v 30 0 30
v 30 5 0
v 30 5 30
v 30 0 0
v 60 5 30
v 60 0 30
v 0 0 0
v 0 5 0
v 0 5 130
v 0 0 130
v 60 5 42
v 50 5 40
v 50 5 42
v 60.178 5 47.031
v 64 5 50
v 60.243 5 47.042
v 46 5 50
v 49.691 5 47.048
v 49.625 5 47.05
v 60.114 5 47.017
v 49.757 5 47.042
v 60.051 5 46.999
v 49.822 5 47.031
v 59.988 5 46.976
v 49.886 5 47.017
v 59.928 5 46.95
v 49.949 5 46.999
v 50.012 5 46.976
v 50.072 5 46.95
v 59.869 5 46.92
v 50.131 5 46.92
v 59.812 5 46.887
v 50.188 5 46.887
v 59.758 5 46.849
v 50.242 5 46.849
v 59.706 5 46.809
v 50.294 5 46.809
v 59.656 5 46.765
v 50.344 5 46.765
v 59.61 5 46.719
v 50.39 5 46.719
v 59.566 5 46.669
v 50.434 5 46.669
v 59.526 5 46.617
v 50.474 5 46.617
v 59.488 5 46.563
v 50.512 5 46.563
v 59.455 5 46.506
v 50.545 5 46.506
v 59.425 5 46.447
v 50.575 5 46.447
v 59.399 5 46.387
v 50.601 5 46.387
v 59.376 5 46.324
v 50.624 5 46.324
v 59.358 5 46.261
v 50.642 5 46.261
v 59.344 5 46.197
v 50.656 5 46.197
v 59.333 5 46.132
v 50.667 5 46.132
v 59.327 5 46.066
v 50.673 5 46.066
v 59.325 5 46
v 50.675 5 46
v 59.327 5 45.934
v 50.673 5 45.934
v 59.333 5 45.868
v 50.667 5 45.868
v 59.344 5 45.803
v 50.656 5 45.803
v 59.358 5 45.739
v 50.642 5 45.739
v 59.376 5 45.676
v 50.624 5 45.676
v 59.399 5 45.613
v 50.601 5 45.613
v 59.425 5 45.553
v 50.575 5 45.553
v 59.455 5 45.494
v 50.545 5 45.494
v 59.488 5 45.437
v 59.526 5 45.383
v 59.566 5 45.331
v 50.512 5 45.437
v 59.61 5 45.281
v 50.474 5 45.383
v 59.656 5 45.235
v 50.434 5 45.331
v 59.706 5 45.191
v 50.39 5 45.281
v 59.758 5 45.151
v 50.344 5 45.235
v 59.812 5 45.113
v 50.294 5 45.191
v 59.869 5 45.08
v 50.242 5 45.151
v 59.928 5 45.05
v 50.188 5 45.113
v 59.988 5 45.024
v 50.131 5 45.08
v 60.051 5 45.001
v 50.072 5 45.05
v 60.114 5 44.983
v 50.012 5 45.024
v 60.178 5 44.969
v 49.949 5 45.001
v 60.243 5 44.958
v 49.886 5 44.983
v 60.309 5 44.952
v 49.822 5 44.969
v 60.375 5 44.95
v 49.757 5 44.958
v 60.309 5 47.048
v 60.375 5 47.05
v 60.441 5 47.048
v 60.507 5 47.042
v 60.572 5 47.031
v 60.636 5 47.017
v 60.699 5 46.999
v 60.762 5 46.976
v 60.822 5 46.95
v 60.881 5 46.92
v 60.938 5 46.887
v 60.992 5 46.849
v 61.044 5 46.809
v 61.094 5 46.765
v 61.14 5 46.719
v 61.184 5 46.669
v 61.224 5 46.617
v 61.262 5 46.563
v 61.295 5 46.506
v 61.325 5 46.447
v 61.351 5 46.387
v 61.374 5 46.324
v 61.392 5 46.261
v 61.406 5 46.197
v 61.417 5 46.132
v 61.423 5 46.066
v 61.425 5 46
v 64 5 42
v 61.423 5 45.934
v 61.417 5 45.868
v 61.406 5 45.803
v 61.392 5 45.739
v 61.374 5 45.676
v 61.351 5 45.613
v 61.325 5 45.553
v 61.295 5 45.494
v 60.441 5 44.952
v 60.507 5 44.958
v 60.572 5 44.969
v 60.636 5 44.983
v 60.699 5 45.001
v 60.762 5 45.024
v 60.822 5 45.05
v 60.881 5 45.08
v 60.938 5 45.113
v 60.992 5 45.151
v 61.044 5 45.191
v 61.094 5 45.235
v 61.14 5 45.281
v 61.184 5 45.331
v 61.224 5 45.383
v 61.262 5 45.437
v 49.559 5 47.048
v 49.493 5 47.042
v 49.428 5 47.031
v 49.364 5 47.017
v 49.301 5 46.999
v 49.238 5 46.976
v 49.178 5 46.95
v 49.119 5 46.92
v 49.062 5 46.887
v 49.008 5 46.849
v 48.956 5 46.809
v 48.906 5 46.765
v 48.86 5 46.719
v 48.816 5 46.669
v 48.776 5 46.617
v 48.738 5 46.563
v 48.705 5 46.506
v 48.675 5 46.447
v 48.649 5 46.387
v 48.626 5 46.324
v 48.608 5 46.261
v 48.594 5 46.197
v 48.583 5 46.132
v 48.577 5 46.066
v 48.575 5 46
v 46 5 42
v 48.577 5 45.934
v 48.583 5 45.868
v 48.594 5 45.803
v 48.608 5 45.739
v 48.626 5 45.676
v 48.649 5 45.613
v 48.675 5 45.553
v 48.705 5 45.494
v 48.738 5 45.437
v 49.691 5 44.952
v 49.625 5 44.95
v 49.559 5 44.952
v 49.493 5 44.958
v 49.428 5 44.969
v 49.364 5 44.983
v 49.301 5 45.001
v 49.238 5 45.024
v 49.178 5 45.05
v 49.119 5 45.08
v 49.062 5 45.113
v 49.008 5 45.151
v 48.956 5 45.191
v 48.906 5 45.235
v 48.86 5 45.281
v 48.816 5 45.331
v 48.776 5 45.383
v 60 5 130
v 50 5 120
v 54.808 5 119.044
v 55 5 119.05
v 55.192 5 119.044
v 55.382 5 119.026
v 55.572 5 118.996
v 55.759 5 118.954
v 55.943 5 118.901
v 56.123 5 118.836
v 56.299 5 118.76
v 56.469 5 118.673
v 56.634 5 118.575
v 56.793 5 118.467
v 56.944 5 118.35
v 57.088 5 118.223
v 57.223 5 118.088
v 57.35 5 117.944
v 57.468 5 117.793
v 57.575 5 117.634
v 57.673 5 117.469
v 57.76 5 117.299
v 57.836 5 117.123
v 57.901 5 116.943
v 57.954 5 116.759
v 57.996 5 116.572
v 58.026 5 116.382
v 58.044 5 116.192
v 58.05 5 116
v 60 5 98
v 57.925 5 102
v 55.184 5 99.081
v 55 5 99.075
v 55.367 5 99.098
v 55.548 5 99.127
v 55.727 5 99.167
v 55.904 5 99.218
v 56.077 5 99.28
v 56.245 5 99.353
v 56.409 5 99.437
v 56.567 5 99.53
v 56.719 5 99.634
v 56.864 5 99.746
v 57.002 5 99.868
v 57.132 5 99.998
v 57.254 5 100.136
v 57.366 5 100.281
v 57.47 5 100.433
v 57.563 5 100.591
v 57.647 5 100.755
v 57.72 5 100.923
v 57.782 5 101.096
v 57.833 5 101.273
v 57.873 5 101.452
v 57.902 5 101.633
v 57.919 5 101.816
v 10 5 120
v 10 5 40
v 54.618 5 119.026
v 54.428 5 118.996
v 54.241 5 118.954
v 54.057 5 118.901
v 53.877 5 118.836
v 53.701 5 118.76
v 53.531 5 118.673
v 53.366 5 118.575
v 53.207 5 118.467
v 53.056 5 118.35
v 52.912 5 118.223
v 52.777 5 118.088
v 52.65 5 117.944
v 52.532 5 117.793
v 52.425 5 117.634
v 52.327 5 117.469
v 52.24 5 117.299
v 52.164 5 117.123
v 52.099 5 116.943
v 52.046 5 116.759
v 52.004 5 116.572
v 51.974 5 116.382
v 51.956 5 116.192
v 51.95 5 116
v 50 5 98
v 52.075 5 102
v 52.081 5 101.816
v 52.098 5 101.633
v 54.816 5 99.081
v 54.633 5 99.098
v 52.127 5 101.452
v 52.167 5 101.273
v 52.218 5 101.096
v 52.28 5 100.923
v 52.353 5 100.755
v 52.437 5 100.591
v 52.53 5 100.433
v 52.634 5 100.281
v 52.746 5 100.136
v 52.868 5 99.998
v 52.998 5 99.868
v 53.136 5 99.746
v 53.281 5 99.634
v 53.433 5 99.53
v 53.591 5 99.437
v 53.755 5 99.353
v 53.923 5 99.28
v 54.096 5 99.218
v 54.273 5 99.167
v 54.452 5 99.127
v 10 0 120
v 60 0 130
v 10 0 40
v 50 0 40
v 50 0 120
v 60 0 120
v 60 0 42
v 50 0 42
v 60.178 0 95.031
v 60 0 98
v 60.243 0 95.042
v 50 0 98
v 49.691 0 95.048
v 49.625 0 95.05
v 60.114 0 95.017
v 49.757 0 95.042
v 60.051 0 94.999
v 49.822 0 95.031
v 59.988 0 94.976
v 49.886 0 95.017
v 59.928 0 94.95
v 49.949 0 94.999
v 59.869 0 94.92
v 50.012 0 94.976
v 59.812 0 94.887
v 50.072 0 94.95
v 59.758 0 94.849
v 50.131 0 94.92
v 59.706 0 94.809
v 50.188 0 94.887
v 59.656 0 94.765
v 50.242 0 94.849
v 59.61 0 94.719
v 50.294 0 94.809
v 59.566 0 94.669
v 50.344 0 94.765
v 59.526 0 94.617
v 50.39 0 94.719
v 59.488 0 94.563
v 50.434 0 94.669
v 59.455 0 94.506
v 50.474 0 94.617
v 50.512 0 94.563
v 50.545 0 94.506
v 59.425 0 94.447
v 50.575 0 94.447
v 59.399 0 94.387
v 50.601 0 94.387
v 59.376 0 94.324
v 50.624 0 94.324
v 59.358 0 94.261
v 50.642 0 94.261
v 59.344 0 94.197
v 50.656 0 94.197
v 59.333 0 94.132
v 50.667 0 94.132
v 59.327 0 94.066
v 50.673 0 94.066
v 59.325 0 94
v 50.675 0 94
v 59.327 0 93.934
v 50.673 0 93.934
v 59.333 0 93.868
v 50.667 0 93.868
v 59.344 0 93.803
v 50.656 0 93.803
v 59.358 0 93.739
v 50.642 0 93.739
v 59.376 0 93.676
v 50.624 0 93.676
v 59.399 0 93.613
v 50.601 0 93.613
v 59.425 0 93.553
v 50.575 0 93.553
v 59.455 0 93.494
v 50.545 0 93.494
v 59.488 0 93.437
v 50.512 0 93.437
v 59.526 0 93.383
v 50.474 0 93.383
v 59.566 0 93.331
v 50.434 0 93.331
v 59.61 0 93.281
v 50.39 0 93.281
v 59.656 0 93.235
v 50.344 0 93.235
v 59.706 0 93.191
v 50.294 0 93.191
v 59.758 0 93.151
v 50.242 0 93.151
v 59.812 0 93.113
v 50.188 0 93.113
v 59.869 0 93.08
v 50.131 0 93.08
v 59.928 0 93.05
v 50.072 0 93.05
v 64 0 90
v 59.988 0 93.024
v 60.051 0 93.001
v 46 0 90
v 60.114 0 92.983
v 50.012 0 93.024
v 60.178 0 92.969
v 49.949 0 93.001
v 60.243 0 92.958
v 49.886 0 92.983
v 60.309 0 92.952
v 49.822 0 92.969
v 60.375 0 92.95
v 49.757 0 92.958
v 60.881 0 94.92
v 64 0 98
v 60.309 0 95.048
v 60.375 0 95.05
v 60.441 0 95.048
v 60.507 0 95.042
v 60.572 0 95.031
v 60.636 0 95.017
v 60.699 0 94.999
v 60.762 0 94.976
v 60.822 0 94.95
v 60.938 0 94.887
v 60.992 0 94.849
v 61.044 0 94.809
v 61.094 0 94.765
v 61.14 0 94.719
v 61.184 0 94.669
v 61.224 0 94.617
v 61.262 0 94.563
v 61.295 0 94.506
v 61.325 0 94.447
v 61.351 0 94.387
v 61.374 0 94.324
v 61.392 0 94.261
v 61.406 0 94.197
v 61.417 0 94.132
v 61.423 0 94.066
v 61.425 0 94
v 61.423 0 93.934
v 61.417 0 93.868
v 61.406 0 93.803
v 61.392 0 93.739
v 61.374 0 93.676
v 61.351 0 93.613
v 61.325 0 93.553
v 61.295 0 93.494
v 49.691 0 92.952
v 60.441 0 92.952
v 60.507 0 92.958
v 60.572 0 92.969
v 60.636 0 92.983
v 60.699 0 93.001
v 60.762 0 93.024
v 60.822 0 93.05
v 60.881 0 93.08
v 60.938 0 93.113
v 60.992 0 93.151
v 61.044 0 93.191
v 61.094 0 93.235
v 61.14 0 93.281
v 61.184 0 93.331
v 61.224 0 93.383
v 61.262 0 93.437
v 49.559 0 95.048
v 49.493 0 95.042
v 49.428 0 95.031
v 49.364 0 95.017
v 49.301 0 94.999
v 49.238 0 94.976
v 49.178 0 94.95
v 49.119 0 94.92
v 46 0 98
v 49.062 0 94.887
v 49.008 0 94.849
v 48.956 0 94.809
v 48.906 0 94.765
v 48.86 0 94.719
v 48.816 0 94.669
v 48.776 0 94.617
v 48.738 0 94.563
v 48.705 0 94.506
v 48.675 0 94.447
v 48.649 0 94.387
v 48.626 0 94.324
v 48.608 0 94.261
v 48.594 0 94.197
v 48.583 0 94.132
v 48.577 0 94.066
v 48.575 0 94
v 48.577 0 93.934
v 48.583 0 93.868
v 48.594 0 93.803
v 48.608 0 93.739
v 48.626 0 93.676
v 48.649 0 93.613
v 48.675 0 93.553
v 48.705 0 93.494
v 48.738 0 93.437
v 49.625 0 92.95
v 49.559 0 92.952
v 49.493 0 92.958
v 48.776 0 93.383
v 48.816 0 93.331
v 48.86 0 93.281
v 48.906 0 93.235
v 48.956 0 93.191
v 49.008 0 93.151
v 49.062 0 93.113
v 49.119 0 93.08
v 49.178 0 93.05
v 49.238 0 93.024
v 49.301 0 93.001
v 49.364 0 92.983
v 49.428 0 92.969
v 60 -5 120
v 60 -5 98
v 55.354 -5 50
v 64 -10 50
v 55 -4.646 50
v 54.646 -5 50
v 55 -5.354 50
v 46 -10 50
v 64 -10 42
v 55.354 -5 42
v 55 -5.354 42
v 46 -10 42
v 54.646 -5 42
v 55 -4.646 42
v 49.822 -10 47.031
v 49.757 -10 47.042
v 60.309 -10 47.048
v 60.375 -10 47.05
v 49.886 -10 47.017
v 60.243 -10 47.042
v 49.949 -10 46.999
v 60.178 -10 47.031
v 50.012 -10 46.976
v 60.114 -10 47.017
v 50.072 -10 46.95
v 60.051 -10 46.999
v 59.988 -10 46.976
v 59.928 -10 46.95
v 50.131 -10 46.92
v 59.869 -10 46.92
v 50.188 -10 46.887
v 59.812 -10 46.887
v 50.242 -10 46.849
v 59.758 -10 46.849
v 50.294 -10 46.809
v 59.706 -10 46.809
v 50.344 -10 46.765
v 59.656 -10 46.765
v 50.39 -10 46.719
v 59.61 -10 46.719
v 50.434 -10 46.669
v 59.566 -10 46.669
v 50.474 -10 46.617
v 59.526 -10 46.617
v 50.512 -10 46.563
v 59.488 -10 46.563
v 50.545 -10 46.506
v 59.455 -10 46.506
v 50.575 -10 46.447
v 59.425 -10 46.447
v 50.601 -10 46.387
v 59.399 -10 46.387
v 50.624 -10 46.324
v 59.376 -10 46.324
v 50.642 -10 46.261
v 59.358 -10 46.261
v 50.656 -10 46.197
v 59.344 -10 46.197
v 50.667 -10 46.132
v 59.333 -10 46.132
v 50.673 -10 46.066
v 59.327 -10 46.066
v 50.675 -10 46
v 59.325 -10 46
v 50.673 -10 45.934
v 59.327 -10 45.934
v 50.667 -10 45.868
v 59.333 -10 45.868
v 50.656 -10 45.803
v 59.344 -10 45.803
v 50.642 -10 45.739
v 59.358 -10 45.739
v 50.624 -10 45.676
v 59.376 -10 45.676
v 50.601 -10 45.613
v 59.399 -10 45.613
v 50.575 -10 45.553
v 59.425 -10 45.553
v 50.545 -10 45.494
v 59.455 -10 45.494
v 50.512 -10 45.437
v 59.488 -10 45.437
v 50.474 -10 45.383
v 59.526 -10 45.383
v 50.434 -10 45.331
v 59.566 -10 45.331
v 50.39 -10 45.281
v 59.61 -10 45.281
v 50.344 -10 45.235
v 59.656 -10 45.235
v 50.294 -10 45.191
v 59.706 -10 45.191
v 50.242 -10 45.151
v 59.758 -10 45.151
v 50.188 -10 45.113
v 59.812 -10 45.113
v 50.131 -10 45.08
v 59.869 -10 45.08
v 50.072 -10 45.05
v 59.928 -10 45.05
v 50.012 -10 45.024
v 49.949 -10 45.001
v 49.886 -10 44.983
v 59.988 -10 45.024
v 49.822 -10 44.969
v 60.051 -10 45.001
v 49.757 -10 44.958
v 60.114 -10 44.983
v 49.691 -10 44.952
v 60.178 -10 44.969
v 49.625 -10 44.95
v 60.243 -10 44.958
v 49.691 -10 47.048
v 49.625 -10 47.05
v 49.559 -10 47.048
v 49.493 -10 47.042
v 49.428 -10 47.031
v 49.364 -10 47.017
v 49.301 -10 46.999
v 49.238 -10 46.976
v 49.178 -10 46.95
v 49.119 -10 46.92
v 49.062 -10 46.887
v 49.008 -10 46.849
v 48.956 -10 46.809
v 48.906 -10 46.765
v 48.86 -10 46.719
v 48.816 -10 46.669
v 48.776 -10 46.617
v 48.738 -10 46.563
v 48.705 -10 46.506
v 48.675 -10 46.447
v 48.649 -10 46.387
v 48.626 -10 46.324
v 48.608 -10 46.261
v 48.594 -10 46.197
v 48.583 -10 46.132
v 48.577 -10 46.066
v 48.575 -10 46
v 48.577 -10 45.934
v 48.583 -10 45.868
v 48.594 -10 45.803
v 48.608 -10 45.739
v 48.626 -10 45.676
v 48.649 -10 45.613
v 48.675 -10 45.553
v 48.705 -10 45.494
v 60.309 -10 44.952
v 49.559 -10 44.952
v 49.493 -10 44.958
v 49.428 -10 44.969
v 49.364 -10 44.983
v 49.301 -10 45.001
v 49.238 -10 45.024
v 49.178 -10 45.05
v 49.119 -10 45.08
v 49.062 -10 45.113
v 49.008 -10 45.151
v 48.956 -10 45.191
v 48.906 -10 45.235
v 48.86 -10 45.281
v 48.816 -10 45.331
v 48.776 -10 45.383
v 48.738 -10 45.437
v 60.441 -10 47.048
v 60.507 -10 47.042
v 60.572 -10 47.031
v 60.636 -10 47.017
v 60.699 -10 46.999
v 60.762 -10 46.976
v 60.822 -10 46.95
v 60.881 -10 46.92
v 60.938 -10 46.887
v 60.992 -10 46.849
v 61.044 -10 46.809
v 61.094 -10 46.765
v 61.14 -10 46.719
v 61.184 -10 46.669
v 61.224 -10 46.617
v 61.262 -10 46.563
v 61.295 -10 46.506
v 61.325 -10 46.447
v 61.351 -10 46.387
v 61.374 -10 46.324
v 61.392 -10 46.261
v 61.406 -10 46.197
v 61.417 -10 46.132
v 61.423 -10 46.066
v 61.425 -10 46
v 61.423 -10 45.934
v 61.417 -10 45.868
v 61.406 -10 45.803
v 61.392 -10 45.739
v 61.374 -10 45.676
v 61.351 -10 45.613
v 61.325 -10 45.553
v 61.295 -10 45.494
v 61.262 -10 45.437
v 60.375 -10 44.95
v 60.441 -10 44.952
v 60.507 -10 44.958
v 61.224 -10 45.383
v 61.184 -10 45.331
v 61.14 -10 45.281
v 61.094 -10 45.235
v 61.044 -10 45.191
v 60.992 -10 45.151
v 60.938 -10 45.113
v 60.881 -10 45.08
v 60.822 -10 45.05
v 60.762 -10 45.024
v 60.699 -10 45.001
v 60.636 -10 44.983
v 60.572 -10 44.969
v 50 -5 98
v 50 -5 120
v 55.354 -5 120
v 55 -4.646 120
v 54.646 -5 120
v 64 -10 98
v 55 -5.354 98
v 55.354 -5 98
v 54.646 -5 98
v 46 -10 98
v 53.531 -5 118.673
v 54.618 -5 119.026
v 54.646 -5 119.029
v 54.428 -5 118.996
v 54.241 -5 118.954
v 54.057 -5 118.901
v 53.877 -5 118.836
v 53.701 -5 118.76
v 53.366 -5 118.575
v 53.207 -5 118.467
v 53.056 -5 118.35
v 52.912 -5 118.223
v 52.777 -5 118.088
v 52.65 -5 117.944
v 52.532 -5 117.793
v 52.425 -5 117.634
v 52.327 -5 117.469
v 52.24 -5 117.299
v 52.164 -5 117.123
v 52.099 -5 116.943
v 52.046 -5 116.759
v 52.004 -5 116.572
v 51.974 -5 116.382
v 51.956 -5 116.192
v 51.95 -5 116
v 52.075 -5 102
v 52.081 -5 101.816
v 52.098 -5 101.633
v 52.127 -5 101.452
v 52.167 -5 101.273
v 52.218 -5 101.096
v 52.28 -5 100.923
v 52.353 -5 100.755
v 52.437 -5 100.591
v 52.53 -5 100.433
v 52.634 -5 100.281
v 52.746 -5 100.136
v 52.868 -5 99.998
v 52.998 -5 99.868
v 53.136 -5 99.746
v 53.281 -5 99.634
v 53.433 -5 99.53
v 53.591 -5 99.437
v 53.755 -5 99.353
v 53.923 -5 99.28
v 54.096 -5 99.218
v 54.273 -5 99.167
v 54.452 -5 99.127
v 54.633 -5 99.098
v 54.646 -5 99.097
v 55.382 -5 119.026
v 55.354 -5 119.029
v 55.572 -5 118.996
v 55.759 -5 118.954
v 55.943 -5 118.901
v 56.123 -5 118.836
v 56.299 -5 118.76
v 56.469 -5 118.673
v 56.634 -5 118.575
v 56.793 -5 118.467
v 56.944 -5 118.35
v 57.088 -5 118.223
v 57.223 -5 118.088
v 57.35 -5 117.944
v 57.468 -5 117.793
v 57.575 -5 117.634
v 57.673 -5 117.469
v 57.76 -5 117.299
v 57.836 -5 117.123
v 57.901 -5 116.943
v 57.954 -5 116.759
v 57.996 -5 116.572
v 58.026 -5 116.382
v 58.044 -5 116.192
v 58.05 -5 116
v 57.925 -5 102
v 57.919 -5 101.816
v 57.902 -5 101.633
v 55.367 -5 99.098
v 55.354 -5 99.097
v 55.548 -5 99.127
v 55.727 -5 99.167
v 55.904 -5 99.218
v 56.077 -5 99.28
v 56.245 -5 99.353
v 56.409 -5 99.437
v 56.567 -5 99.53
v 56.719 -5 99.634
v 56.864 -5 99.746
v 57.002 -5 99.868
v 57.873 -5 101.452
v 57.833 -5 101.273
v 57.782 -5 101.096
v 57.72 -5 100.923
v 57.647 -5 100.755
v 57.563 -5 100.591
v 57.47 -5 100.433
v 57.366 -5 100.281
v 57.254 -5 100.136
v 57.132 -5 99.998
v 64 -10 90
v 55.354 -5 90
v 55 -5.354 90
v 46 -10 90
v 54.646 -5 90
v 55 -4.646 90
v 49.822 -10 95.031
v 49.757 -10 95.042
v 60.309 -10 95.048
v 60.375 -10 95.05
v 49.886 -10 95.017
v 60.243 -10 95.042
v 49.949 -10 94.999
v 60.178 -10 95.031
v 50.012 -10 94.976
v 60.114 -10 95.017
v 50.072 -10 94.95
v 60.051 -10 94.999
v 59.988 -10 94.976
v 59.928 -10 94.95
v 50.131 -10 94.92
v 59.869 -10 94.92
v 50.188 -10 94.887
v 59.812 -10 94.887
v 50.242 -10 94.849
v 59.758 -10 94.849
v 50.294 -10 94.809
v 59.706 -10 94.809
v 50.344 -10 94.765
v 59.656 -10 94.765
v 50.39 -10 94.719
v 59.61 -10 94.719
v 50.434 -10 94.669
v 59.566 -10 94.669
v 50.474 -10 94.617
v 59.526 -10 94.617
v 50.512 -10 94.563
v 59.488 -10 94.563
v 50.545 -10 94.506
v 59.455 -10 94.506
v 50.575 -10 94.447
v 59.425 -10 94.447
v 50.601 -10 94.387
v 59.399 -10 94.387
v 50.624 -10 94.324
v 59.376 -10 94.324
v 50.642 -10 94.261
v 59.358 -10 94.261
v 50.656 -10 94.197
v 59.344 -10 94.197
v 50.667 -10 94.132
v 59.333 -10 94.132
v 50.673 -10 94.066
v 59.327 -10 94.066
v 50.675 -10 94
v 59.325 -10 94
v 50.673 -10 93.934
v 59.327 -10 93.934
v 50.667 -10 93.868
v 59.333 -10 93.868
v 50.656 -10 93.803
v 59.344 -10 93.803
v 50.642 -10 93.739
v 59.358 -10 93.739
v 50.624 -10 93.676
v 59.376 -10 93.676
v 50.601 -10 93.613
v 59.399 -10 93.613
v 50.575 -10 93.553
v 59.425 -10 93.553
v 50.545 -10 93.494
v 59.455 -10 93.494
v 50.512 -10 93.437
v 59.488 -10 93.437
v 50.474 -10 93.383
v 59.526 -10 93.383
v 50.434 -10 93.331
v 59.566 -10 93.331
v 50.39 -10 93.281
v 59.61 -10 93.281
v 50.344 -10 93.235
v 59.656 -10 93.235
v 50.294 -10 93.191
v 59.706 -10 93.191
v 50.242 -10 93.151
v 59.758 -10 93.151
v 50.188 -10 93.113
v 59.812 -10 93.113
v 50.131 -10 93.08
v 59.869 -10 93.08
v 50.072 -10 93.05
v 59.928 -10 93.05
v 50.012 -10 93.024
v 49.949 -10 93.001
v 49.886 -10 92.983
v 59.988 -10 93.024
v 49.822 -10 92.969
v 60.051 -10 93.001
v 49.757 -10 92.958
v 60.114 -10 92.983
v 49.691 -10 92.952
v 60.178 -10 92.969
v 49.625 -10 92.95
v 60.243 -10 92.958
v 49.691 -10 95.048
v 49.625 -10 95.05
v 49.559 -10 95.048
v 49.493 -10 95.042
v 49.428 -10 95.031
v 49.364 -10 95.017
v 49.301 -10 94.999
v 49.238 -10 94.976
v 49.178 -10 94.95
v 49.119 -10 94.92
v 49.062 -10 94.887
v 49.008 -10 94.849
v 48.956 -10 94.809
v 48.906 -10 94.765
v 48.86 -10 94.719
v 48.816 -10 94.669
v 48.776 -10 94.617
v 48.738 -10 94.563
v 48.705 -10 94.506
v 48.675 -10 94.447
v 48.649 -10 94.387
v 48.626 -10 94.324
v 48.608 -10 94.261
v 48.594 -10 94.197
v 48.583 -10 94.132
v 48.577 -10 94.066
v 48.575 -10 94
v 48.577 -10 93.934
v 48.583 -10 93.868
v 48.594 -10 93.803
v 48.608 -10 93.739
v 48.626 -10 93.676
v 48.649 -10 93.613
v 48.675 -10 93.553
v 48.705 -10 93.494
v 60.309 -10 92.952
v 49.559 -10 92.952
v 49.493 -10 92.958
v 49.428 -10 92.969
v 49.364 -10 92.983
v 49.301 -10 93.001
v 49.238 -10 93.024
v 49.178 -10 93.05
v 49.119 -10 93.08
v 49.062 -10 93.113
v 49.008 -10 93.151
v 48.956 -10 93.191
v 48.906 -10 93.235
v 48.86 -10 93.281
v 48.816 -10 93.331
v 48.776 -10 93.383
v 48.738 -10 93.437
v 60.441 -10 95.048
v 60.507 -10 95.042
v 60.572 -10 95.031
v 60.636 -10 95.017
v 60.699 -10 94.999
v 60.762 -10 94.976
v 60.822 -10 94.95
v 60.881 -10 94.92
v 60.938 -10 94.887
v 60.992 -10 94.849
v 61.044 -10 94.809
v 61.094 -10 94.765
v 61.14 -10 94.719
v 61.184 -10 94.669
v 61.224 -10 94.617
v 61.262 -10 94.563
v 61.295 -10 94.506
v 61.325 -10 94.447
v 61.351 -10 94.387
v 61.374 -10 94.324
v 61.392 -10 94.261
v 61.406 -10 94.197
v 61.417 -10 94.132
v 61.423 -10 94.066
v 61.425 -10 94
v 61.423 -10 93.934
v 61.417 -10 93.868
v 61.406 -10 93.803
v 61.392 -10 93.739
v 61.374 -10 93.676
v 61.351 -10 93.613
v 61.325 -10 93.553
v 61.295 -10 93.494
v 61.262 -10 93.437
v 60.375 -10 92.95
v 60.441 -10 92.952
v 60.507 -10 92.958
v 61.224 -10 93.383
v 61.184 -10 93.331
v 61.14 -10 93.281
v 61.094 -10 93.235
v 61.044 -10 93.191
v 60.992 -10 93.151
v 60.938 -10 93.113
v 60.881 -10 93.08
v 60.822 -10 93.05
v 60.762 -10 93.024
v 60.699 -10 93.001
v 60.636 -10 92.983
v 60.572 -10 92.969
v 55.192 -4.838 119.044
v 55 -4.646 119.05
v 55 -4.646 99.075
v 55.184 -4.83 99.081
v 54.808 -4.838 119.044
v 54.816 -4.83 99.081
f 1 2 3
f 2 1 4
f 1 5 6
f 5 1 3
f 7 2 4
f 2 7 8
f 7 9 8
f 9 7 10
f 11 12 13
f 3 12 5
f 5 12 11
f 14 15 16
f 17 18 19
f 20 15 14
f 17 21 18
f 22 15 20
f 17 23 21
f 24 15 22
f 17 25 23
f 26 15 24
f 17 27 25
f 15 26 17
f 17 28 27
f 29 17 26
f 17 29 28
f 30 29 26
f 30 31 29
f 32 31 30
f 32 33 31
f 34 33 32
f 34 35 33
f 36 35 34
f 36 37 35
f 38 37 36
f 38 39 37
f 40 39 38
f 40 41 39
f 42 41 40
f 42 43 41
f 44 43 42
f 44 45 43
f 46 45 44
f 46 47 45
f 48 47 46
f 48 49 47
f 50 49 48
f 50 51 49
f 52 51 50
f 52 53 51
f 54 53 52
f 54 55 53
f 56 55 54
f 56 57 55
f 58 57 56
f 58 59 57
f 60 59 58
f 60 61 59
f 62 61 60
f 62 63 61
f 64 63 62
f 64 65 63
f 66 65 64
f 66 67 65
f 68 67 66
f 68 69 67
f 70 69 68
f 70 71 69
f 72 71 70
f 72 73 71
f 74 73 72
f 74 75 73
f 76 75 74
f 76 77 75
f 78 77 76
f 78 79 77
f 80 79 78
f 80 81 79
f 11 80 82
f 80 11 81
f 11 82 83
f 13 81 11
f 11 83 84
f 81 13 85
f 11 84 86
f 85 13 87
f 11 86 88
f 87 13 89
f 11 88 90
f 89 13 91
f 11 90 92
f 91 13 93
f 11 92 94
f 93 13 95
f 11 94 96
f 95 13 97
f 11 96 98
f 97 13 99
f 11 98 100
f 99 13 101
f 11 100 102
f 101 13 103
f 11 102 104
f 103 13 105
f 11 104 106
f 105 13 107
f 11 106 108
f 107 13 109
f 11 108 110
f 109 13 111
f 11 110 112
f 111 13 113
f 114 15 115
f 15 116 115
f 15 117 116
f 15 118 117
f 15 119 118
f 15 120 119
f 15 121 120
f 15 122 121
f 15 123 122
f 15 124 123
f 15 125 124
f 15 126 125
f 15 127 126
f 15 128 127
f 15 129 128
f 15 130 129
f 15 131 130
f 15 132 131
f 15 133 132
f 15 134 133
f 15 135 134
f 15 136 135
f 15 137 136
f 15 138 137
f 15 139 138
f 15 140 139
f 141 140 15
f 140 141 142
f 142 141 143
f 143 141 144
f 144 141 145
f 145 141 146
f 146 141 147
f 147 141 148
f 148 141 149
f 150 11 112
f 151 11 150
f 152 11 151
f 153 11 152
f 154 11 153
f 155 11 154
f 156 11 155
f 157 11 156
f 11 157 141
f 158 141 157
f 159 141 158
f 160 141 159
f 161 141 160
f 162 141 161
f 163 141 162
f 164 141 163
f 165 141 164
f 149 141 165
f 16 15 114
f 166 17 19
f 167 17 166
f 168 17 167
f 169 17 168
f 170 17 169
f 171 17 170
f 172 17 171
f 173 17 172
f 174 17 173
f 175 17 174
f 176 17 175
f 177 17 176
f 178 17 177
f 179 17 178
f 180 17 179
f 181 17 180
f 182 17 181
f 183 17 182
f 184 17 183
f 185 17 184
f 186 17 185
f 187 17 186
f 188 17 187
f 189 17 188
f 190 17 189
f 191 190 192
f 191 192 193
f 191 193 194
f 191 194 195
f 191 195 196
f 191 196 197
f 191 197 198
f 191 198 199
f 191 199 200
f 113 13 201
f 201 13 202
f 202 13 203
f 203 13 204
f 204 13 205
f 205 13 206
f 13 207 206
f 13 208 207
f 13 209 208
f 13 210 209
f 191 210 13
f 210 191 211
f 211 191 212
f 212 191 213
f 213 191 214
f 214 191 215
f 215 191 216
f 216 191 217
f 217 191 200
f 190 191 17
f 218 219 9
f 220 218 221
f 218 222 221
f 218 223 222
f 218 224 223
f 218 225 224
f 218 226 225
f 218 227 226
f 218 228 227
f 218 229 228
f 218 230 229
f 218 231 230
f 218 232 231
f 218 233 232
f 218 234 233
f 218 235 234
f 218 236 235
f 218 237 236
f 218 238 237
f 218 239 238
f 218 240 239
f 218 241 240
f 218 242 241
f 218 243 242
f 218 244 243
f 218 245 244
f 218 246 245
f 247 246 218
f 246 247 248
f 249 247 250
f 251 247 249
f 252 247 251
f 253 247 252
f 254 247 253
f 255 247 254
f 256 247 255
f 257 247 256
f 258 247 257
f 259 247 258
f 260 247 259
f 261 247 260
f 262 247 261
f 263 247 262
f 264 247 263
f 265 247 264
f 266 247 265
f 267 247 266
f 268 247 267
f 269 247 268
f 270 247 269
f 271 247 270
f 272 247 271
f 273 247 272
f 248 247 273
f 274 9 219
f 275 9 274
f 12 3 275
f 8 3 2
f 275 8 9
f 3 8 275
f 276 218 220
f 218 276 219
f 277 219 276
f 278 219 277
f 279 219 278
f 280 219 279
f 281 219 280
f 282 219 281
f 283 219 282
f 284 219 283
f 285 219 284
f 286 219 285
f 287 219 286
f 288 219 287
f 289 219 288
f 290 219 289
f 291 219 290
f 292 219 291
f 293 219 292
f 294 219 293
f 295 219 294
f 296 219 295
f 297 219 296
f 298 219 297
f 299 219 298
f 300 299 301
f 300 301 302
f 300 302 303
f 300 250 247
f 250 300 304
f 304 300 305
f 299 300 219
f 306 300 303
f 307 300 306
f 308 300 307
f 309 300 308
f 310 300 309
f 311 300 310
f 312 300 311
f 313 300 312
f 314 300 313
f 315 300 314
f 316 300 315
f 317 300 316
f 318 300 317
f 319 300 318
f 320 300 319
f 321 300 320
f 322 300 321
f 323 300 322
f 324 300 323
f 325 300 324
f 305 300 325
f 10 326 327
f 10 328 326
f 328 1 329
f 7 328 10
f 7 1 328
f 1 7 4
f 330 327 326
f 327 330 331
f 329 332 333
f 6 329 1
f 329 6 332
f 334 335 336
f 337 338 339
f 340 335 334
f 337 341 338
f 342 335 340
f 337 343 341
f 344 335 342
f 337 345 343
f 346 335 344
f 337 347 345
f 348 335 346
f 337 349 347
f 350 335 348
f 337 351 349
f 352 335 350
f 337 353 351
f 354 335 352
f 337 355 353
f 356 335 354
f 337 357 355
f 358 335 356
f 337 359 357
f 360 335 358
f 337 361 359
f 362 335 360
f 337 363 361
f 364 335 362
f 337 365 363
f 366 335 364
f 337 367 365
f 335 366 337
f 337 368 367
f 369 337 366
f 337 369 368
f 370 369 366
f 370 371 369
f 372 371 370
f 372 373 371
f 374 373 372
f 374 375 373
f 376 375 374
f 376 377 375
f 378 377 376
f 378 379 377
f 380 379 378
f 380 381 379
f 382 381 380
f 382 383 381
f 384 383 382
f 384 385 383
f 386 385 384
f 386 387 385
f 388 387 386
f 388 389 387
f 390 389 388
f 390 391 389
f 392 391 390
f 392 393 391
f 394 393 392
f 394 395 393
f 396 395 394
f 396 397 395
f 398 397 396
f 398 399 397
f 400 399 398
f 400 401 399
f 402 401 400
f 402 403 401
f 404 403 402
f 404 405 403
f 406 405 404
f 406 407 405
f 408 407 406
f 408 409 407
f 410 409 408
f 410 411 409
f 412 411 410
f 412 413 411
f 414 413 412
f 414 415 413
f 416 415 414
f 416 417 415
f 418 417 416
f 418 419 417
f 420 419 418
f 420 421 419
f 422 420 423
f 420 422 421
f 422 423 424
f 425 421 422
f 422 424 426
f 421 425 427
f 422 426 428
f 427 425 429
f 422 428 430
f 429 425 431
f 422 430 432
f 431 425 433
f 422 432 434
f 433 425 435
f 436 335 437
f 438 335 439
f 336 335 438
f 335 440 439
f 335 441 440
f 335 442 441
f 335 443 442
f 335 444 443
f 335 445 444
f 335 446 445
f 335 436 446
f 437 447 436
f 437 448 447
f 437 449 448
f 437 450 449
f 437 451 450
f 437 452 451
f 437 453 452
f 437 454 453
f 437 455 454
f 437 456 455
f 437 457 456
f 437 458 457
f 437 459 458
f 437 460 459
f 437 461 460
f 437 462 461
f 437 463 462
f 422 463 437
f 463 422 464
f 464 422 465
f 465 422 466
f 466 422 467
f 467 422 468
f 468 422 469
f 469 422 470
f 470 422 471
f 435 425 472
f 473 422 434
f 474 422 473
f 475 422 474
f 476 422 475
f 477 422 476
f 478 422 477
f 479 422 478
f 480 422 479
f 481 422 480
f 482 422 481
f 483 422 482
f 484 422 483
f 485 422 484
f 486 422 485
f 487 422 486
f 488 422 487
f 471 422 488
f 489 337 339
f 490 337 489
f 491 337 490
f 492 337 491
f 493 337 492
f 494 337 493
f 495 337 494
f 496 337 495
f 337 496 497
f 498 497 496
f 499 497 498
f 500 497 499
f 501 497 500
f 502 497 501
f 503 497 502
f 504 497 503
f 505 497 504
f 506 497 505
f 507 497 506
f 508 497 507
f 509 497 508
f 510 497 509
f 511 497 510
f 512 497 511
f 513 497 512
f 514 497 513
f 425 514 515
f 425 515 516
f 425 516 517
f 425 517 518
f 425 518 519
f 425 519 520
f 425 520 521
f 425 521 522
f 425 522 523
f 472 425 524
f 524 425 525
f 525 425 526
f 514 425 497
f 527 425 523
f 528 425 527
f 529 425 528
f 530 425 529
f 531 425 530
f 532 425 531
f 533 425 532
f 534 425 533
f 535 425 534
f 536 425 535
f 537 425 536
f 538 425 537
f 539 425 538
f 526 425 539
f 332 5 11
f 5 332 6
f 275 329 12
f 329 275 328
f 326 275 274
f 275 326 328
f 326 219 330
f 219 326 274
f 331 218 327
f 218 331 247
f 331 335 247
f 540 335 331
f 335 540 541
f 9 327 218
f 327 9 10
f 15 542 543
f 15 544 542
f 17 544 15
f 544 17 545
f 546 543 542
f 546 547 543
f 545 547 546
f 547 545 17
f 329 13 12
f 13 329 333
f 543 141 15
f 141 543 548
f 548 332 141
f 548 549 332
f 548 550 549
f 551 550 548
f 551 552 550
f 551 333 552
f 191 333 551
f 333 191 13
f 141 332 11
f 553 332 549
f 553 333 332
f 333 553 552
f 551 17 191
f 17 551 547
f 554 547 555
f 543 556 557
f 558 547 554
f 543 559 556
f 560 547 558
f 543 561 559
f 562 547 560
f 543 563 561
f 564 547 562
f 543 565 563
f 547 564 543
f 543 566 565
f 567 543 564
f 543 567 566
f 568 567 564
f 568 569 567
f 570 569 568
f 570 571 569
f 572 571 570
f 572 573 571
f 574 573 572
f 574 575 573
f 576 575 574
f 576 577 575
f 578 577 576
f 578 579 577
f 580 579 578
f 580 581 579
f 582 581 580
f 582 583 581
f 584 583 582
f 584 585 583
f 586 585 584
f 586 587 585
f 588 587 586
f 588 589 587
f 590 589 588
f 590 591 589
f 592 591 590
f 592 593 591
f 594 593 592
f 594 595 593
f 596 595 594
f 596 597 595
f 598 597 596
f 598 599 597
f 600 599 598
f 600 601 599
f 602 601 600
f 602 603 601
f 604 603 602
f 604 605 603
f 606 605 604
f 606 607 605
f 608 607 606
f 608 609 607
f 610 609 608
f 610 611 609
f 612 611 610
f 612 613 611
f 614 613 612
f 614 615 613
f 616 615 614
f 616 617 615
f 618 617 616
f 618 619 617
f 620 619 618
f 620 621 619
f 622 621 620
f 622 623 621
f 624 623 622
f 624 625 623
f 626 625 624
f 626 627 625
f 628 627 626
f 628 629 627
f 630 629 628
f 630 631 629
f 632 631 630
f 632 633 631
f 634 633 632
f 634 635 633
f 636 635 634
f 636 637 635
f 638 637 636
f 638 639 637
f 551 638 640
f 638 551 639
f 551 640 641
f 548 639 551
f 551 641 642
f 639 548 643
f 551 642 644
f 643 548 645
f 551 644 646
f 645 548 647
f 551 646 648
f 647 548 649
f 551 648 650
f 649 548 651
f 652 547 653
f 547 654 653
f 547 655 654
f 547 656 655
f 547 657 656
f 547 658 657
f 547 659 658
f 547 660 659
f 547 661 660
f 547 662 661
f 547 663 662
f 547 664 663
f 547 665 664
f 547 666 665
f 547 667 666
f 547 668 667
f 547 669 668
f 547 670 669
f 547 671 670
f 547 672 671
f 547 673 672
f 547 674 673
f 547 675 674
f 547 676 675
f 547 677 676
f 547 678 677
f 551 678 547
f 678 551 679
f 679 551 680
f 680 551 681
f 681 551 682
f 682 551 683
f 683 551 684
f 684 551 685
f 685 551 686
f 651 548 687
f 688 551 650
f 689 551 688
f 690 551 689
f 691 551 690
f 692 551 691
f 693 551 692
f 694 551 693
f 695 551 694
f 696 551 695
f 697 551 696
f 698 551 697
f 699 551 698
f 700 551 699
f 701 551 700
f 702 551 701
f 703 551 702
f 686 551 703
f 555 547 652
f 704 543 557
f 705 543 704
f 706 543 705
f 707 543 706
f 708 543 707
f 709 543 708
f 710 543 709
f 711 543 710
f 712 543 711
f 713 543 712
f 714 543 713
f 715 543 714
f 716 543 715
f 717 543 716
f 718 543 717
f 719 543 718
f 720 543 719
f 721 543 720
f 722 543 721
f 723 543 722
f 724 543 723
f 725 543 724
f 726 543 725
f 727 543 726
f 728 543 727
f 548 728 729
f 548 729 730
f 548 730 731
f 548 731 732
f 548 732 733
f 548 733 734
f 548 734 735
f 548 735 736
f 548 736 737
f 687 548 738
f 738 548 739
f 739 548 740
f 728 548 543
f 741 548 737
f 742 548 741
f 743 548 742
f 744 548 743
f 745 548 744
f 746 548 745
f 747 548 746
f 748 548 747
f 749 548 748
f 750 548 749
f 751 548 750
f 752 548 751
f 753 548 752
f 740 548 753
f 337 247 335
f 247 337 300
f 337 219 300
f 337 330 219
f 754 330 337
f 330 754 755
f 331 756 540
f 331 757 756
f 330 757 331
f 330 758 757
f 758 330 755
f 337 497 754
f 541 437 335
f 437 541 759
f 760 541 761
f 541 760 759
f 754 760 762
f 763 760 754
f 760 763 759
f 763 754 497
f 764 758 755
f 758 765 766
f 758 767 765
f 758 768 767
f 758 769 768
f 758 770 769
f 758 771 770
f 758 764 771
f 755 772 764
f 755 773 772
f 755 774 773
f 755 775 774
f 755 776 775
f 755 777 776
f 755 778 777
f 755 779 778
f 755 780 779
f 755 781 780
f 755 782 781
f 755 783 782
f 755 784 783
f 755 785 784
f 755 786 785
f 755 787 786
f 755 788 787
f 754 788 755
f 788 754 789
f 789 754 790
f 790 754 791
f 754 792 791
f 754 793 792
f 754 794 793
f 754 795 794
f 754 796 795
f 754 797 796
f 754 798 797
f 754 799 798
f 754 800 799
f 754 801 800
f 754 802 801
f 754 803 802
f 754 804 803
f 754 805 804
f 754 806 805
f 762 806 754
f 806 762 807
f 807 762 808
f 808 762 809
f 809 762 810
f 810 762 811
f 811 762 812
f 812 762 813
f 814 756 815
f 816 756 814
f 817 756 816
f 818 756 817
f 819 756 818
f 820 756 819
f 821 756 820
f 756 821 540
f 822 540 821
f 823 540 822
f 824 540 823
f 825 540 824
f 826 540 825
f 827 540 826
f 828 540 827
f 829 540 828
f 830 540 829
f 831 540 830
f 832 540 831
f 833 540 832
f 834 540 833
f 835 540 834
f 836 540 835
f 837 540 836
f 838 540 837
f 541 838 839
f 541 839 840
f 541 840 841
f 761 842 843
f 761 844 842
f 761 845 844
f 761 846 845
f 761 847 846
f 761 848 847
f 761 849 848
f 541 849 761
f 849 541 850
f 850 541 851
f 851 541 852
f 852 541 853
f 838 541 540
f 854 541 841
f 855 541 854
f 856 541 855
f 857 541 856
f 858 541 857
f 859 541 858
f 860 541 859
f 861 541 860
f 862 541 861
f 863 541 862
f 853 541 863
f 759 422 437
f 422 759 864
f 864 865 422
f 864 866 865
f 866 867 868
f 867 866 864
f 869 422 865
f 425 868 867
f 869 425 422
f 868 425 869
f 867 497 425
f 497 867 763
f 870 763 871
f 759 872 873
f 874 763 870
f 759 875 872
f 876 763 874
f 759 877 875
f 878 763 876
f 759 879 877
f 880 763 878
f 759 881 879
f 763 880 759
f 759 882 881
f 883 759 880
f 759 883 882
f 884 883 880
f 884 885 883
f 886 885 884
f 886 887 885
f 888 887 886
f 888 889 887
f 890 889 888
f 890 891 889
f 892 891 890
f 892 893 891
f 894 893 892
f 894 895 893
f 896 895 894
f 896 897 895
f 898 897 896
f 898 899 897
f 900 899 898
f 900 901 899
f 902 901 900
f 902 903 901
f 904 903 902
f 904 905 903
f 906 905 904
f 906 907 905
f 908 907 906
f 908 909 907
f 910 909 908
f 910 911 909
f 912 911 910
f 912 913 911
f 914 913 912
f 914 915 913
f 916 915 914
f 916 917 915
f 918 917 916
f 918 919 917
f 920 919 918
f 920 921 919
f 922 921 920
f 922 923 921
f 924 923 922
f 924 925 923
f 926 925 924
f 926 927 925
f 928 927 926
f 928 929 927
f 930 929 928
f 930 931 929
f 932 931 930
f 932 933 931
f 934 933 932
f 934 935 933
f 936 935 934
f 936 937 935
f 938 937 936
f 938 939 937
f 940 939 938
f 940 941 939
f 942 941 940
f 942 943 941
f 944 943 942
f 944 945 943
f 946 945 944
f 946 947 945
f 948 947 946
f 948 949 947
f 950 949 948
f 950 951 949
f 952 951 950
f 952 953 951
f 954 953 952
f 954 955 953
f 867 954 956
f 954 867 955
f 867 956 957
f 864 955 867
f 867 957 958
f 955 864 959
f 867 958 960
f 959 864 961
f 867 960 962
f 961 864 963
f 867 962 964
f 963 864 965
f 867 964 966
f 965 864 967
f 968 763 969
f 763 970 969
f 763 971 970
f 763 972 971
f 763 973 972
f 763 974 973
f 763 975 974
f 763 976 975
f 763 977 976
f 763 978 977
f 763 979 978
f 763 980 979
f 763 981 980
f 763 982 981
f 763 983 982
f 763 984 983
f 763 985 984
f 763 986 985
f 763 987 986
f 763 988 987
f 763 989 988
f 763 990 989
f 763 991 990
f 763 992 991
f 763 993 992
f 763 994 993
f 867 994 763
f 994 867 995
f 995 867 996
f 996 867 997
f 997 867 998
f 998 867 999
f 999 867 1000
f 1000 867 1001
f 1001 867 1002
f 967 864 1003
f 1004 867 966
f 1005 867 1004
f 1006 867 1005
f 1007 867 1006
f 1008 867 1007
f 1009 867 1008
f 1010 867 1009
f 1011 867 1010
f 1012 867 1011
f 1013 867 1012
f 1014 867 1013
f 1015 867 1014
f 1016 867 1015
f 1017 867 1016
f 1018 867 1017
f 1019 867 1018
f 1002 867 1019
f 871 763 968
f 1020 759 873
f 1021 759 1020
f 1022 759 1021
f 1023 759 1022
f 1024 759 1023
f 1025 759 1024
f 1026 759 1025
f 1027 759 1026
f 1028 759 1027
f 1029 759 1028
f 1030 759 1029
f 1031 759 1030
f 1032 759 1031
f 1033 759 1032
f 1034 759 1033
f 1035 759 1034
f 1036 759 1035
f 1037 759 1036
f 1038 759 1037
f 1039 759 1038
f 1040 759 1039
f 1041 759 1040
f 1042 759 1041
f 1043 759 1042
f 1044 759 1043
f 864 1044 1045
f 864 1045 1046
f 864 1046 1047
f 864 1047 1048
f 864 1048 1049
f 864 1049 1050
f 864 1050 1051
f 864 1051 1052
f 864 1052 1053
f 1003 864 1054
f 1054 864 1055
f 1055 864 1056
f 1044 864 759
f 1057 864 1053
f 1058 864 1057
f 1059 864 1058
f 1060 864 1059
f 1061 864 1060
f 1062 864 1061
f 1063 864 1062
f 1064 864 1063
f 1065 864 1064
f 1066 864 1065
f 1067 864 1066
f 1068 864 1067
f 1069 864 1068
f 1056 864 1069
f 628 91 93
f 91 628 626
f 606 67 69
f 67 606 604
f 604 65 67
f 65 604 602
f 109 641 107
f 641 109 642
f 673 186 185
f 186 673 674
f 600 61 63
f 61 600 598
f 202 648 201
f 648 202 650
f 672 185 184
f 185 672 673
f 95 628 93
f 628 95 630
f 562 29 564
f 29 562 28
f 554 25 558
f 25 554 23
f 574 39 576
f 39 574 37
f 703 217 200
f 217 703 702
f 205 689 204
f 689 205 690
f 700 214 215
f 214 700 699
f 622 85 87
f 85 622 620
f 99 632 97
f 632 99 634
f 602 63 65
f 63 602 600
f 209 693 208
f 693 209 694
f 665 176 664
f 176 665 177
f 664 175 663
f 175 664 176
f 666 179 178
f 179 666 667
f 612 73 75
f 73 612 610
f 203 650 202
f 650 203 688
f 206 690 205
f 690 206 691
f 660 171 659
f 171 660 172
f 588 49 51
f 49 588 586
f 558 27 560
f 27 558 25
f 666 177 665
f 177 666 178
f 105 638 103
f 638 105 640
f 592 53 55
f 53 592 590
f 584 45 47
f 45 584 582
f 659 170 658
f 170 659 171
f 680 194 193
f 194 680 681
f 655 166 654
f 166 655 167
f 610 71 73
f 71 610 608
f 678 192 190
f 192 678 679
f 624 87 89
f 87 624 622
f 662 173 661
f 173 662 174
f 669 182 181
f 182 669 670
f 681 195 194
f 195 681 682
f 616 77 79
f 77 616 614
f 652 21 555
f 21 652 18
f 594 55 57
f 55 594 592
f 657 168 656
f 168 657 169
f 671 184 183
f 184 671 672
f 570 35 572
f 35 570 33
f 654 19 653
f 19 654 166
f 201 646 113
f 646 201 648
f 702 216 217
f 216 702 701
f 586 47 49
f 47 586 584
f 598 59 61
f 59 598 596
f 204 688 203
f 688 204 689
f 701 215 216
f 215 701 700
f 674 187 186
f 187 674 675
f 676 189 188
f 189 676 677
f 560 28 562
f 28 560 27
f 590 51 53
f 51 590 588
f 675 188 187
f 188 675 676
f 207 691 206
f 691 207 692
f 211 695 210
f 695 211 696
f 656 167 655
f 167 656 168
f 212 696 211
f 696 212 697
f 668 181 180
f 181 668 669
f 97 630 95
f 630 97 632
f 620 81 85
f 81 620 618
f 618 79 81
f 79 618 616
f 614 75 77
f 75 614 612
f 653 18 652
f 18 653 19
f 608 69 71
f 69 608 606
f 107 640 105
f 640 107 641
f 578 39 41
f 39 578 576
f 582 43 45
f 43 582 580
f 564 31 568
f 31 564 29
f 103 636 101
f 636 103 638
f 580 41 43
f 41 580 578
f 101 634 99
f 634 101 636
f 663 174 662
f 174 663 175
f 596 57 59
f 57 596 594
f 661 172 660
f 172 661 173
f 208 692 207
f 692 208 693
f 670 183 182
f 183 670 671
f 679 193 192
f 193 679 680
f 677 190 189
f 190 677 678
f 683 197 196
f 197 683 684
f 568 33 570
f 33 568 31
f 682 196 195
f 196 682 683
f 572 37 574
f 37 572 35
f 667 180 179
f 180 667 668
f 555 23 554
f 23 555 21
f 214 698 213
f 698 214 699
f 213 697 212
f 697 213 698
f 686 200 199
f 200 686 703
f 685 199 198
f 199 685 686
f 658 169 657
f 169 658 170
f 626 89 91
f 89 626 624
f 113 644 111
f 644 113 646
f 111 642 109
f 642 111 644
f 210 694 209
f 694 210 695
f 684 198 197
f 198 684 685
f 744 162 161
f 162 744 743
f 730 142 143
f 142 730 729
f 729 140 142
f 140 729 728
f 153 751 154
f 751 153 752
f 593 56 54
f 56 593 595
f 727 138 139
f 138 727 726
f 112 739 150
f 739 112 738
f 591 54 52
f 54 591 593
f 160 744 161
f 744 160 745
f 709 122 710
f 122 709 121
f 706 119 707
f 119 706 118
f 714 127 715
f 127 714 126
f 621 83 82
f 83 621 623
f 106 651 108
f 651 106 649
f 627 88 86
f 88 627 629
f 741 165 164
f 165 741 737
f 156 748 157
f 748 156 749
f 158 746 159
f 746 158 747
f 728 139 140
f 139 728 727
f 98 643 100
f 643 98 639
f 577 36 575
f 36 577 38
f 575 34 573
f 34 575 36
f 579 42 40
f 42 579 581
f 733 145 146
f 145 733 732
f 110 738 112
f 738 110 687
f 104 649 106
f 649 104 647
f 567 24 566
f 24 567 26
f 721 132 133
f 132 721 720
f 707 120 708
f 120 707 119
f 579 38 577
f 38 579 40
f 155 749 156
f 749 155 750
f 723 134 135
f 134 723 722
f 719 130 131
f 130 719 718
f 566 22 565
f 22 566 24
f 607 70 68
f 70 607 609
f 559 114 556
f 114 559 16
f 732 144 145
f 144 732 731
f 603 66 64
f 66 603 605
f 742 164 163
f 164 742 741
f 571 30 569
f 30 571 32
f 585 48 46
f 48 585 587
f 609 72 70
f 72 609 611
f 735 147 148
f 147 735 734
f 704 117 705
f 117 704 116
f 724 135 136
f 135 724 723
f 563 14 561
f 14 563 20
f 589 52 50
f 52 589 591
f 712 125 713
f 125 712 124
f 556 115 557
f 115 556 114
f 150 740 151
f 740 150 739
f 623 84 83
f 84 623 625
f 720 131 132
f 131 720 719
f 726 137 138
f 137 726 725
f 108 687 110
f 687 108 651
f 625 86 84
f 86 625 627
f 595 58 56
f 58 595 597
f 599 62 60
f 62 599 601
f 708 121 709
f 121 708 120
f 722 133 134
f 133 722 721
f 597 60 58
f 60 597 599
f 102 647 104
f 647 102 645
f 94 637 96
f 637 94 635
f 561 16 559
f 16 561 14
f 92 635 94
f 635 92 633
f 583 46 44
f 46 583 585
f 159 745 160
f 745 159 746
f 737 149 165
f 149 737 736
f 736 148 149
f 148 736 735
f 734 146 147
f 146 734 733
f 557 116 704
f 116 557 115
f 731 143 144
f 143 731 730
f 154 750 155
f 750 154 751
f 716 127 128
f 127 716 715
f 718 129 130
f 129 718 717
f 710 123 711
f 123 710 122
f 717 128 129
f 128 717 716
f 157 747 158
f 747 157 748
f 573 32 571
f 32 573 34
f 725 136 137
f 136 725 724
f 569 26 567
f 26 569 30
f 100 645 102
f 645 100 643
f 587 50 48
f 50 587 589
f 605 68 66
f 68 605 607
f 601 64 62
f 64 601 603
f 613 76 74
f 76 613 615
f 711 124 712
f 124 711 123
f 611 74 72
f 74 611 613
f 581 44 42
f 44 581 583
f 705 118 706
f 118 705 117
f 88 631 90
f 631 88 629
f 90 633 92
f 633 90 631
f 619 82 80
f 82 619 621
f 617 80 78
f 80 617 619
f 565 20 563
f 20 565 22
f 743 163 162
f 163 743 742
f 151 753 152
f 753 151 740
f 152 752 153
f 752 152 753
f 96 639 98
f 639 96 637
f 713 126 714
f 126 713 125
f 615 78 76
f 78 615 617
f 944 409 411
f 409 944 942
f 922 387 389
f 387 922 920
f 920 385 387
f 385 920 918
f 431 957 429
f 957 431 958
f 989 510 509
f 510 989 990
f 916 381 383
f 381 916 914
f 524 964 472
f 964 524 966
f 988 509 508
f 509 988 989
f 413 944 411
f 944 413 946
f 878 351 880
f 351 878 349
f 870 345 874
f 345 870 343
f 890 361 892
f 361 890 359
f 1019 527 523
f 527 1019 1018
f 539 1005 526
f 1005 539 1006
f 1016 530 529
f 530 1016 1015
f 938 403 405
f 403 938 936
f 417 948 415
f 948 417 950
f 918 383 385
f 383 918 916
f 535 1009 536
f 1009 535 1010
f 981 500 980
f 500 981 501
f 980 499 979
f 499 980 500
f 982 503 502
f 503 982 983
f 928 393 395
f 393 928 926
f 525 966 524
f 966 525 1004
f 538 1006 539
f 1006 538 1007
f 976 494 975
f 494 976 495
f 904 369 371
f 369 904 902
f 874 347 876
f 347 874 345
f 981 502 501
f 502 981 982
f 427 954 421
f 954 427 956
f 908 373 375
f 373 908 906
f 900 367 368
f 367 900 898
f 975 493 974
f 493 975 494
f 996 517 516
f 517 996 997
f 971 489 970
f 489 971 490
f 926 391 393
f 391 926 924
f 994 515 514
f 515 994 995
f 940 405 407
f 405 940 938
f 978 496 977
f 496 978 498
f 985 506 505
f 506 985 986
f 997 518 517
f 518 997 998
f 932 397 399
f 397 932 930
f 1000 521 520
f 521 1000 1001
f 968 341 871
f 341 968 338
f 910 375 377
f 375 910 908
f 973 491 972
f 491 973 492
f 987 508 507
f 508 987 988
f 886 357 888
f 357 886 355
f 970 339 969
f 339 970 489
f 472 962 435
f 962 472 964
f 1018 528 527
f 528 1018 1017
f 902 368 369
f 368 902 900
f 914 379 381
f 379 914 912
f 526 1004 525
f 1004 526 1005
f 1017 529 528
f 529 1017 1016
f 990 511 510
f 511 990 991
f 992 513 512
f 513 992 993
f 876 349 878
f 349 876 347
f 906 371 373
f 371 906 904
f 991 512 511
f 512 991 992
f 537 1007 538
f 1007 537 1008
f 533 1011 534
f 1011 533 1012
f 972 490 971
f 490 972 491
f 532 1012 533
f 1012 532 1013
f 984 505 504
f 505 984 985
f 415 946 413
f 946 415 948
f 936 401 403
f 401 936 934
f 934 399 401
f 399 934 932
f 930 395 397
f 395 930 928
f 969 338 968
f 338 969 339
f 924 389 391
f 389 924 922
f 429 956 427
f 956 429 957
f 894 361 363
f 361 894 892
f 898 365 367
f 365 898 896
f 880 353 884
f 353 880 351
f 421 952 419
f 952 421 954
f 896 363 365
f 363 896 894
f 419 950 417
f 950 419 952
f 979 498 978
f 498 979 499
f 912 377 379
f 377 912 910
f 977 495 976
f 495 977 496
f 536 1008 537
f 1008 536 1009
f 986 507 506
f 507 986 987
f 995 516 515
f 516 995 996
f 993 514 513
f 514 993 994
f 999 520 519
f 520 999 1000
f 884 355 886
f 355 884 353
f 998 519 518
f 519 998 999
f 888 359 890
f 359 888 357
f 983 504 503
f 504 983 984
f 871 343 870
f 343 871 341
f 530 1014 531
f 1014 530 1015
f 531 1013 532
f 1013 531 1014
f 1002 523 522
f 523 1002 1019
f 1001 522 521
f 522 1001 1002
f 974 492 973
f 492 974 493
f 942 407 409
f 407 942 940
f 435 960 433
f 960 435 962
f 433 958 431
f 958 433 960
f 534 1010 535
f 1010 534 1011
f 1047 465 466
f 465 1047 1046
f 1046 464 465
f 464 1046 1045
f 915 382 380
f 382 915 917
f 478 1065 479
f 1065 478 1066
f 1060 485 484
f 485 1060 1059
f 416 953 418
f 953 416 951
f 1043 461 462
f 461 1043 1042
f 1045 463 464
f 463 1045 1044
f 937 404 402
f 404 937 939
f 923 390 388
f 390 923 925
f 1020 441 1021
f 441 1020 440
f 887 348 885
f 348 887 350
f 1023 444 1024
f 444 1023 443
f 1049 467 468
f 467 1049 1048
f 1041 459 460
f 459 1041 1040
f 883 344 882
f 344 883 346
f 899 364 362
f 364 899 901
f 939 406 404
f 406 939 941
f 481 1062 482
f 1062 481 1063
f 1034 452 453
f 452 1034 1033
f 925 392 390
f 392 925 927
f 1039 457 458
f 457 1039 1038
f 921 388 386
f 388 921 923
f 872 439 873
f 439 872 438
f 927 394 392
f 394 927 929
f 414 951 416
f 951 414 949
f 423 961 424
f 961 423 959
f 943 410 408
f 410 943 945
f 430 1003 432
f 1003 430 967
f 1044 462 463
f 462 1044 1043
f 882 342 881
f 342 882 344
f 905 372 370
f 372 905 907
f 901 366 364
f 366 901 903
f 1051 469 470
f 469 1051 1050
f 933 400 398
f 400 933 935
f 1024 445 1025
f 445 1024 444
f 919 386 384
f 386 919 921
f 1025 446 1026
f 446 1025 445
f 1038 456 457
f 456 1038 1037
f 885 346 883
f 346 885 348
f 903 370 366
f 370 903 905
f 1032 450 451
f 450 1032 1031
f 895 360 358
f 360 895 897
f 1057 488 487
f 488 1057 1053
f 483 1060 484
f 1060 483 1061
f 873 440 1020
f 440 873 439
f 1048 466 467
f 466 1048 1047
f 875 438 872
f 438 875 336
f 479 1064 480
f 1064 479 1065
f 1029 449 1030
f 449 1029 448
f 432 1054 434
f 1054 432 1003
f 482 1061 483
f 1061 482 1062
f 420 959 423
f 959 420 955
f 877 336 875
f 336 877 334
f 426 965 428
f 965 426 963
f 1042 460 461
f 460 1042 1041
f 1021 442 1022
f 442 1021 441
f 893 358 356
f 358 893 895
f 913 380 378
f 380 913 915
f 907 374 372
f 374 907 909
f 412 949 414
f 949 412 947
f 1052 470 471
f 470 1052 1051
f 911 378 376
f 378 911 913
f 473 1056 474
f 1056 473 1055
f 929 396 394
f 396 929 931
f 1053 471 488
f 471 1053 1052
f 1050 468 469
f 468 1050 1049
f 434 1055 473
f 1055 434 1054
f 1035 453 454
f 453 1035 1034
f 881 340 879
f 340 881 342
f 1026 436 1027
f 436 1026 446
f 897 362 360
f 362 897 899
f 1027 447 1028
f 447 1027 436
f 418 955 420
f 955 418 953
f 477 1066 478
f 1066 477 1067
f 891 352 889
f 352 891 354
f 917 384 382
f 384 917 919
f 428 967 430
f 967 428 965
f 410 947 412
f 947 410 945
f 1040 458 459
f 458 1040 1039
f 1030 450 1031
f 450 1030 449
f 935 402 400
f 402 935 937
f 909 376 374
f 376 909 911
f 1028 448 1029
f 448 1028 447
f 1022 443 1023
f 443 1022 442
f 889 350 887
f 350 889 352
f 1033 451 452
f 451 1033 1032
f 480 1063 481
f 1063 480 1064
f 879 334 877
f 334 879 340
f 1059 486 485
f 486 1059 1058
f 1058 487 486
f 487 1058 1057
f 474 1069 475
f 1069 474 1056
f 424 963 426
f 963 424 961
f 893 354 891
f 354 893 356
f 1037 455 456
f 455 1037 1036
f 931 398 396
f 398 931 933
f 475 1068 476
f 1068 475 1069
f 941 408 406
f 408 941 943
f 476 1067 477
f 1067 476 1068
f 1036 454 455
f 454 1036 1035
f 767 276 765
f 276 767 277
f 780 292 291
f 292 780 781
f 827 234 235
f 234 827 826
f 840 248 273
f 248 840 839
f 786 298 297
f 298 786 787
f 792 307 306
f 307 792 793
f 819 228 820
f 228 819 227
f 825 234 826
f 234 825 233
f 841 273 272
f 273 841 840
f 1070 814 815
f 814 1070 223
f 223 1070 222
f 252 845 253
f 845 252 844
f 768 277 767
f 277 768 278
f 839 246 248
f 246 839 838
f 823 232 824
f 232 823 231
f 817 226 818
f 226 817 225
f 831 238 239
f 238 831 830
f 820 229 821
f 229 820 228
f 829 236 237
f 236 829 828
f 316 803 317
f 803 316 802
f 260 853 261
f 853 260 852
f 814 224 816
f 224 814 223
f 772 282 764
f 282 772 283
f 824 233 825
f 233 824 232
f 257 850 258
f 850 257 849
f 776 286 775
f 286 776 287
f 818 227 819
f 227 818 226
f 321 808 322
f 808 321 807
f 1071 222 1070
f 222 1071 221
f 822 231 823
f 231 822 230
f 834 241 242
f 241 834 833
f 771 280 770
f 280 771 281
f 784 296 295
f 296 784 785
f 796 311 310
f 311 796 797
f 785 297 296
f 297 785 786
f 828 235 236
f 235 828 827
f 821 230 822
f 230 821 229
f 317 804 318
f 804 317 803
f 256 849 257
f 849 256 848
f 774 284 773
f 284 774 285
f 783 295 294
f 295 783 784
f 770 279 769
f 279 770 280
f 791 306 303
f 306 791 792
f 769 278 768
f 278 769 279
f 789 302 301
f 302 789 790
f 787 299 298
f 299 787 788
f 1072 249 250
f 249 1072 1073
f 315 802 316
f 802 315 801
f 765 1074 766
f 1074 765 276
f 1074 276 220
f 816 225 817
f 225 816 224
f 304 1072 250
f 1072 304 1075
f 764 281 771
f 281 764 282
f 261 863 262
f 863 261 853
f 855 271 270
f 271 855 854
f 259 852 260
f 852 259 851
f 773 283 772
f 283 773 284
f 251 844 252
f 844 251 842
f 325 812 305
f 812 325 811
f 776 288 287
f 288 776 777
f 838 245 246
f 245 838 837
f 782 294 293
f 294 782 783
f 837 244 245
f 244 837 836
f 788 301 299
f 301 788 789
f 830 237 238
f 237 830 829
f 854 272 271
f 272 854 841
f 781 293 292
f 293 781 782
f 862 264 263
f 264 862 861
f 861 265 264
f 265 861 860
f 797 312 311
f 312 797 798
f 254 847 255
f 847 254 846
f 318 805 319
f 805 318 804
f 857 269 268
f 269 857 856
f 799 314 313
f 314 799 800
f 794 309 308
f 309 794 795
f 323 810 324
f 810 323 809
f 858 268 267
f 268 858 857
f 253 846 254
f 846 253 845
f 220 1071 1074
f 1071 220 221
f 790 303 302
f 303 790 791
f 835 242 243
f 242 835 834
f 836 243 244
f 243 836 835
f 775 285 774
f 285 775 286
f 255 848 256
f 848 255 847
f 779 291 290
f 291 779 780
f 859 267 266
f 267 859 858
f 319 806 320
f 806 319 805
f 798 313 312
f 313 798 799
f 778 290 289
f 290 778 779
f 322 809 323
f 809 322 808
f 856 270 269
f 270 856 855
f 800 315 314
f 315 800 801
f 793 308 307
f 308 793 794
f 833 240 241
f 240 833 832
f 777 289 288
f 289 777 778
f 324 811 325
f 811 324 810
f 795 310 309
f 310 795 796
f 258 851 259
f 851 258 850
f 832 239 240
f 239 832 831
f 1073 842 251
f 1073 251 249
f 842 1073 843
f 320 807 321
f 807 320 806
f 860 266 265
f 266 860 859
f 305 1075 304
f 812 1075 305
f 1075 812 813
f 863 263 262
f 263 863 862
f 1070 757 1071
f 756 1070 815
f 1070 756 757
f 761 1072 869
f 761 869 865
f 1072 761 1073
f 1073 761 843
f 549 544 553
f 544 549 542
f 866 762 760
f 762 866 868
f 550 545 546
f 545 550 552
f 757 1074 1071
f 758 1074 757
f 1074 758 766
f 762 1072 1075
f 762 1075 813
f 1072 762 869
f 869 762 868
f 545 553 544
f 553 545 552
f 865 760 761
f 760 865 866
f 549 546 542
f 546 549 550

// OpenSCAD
// ----- ----- ----- Declaração de Variáveis ----- ----- ----- //
res=100;
folga1=0.125;

esp=5;
compriObilongo=20;
largObi=5.85;

haste1x=30;
haste1z=30;

haste2x=60;
haste2z=10;

haste3x=10;
haste3z=60+20;

haste4x=10;
haste4z=10;

portax=18;
portaz=8;

entreFuros=(8.6+12.9)/2;
rFuro=2.1/2;

vao=0.5;

// ----- ----- ----- Declaração de Funções ----- ----- ----- //

// ----- ----- ----- MAIN ----- ----- ----- //
difference(){
    translate([0,0,0]){
        cube([haste1x,esp,haste1z]);
        translate([0,0,haste1z])cube([haste2x,esp,haste2z]);
        translate([0,0,haste1z+haste2z])cube([haste3x,esp,haste3z]);
        translate([0,0,haste1z+haste2z+haste3z])cube([haste2x,esp,haste2z]);
        translate([haste2x-haste3x,0,haste1z+haste2z])cube([haste4x,esp,haste4z]);
        translate([haste2x-haste3x+haste4x/2-portax/2,-esp,haste1z+haste2z+haste4z-portaz])cube([portax,esp,portaz]);
        translate([haste2x-haste3x+haste4x/2-portax/2,0,haste1z+haste2z+haste4z-portaz])cube([portax,esp,portaz]);//
        translate([haste2x-haste3x+haste4x/2-portax/2,-2*esp,haste1z+haste2z+haste4z-portaz])cube([portax,esp,portaz]);
        translate([haste2x-haste3x,0,haste1z+haste2z+haste3z-haste4z-compriObilongo+portaz])cube([haste4x,esp,haste4z+compriObilongo-portaz]);
        translate([haste2x-haste3x,-esp,haste1z+haste2z+haste3z-haste4z-compriObilongo+portaz])cube([haste4x,esp,haste4z+compriObilongo-portaz]);
        translate([haste2x-haste3x+haste4x/2-portax/2,-esp,haste1z+haste2z+haste3z-haste4z-compriObilongo])cube([portax,esp,portaz]);
        translate([haste2x-haste3x+haste4x/2-portax/2,-esp,haste1z+haste2z+haste3z-haste4z-compriObilongo])cube([portax,esp,portaz]);
        translate([haste2x-haste3x+haste4x/2-portax/2,-2*esp,haste1z+haste2z+haste3z-haste4z-compriObilongo])cube([portax,esp,portaz]);
    }
    
    // Furos do Porta
    #translate([-entreFuros/2,-2*esp,0])
    #translate([haste2x-haste4x/2,0,haste1z+haste2z+haste4z-portaz/2])
    #rotate([-90,0,0])
    #cylinder(3*esp,rFuro,rFuro,$fn=res);
    
    #translate([entreFuros/2,-2*esp,0])
    #translate([haste2x-haste4x/2,0,haste1z+haste2z+haste4z-portaz/2])
    #rotate([-90,0,0])
    #cylinder(3*esp,rFuro,rFuro,$fn=res);
    
    #translate([-entreFuros/2,-2*esp,haste1z+haste2z+haste3z-haste4z-20])
    #translate([haste2x-haste4x/2,0,portaz/2])
    #rotate([-90,0,0])
    #cylinder(2*esp,rFuro,rFuro,$fn=res);
    
    #translate([entreFuros/2,-2*esp,haste1z+haste2z+haste3z-haste4z-20])
    #translate([haste2x-haste4x/2,0,portaz/2])
    #rotate([-90,0,0])
    #cylinder(2*esp,rFuro,rFuro,$fn=res);
    
    //Furo Obilongo
    #hull(){
        #translate([haste2x-haste4x/2,-2*esp,haste1z+haste2z+haste3z-haste4z-20+(3/2)*portaz])
        #rotate([-90,0,0])
        #cylinder(4*esp,largObi/2,largObi/2,$fn=res);
        
        #translate([0,0,haste4z+compriObilongo-2*portaz])
        #translate([haste2x-haste4x/2,-2*esp,haste1z+haste2z+haste3z-haste4z-20+(3/2)*portaz])
        #rotate([-90,0,0])
        #cylinder(4*esp,largObi/2+folga1,largObi/2+folga1,$fn=res);
    }
    
    #translate([haste2x-haste4x/2,-esp,0])
    #rotate([0,0,45])
    #translate([-vao/2,-vao/2,0])
    #cube([vao,vao,haste1z+2*haste2z+haste3z]);
}
